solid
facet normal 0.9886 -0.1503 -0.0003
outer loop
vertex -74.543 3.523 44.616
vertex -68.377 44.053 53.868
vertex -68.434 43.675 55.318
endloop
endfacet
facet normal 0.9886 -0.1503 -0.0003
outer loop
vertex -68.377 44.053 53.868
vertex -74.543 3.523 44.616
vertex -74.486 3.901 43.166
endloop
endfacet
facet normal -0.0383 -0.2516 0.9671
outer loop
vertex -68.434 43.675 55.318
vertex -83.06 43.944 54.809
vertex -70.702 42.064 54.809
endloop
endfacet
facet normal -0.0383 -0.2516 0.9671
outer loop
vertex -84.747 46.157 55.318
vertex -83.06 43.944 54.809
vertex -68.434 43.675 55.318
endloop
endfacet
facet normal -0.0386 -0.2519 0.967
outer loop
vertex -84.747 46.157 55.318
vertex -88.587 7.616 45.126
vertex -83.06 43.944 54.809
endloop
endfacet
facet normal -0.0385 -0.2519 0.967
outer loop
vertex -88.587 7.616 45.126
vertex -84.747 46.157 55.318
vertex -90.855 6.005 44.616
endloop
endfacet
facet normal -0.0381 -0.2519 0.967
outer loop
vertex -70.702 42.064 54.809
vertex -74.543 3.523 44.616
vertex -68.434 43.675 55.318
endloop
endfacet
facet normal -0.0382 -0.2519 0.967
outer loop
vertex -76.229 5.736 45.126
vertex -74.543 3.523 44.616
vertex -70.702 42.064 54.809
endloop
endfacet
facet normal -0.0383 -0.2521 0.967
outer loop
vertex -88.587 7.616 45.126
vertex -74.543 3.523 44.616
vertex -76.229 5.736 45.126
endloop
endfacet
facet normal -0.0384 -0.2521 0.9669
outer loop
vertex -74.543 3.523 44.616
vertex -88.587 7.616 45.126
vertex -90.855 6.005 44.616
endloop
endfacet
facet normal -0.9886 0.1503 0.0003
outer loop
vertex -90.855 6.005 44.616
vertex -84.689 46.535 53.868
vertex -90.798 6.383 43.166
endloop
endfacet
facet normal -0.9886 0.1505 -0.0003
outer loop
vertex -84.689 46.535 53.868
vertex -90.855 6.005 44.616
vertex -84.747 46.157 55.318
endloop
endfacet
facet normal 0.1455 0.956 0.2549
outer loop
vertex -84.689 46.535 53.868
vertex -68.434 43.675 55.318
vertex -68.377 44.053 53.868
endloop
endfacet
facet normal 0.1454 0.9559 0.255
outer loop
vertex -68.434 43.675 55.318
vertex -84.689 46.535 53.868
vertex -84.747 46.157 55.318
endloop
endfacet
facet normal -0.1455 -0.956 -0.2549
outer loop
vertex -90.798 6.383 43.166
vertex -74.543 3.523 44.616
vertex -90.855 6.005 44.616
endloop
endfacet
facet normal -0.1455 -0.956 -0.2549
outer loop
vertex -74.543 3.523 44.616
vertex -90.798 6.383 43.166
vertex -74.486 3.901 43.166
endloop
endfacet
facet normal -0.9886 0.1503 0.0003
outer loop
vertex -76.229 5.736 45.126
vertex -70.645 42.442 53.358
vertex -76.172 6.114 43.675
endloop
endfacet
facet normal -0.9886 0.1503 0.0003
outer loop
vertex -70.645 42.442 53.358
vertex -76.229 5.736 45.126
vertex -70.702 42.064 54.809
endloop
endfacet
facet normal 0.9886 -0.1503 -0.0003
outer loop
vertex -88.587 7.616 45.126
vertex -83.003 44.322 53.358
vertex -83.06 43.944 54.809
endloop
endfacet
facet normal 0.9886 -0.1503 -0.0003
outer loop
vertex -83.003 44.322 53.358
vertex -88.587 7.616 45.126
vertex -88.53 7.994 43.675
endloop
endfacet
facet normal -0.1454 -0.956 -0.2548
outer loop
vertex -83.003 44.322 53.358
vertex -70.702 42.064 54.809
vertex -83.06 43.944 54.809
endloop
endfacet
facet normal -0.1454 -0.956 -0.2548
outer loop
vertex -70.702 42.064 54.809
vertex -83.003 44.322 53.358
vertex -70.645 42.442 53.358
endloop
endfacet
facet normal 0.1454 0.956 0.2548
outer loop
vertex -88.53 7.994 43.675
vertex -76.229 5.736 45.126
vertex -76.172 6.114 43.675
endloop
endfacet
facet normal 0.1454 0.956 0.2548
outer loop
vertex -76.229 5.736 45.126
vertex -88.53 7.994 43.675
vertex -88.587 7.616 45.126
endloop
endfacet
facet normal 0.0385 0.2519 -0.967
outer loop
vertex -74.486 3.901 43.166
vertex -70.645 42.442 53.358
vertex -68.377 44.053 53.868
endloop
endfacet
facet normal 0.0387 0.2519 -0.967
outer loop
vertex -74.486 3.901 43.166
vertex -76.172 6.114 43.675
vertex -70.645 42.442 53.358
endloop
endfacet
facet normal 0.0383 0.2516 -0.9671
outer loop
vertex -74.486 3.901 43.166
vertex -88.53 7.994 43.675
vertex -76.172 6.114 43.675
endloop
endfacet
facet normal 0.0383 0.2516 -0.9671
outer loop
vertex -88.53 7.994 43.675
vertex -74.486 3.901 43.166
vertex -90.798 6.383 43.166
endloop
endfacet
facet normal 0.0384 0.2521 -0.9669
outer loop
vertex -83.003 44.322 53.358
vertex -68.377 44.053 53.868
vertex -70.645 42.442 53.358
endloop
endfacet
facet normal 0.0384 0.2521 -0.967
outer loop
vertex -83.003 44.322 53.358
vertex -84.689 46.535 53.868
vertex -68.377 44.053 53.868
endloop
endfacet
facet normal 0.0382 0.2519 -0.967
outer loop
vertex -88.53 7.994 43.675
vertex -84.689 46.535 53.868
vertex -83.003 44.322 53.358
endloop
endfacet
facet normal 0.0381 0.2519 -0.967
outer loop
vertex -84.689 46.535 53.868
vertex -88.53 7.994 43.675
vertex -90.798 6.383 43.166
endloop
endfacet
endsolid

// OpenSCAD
// Generated by SolidPython 1.1.3 on 2025-12-31 05:06:49


translate(v = [-79.52985690209567, 25.595877133079668, 47.06634805542881]) {
	rotate(a = [14.7627925 , 0.        ,-8.65071739]) {
		difference() {
			cube(center = true, size = [16.5000000000, 42.0000000000, 6.0000000000]);
			cube(center = true, size = [12.5000000000, 38.0000000000, 6.1000000000]);
			translate(v = [0.0000000000, 0.0000000000, -1.5000000000]) {
				cube(center = true, size = [18.5000000000, 44.0000000000, 6.0000000000]);
			}
		}
	}
}
/***********************************************
*********      SolidPython code:      **********
************************************************
 
import solid as sl

debug_trace = False

def debugprint(info):
    if debug_trace:
        print(info)

def box(width, height, depth):
    return sl.cube([width, height, depth], center=True)


def cylinder(radius, height, segments=100):
    return sl.cylinder(r=radius, h=height, segments=segments, center=True)


def sphere(radius):
    return sl.sphere(radius)


def cone(r1, r2, height):
    return sl.cylinder(r1=r1, r2=r2, h=height)  # , center=True)


def rotate(shape, angle):
    if shape is None:
        return None
    return sl.rotate(angle)(shape)


def translate(shape, vector):
    if shape is None:
        return None
    return sl.translate(tuple(vector))(shape)


def mirror(shape, plane=None):
    debugprint('mirror()')
    planes = {
        'XY': [0, 0, 1],
        'YX': [0, 0, -1],
        'XZ': [0, 1, 0],
        'ZX': [0, -1, 0],
        'YZ': [1, 0, 0],
        'ZY': [-1, 0, 0],
    }
    return sl.mirror(planes[plane])(shape)


def union(shapes):
    debugprint('union()')
    shape = None
    for item in shapes:
        if item is not None:
            if shape is None:
                shape = item
            else:
                shape += item
    return shape


def add(shapes):
    debugprint('union()')
    shape = None
    for item in shapes:
        if item is not None:
            if shape is None:
                shape = item
            else:
                shape += item
    return shape


def difference(shape, shapes):
    debugprint('difference()')
    for item in shapes:
        if item is not None:
            shape -= item
    return shape


def intersect(shape1, shape2):
    if shape2 is not None:
        return sl.intersection()(shape1, shape2)
    else:
        return shape1

def hull_from_points(points):
    return sl.hull()(*points)


def hull_from_shapes(shapes, points=None):
    hs = []
    if points is not None:
        hs.extend(points)
    if shapes is not None:
        hs.extend(shapes)
    return sl.hull()(*hs)


def tess_hull(shapes, sl_tol=.5, sl_angTol=1):
    return sl.hull()(*shapes)


def triangle_hulls(shapes):
    debugprint('triangle_hulls()')
    hulls = []
    for i in range(len(shapes) - 2):
        hulls.append(hull_from_shapes(shapes[i: (i + 3)]))

    return union(hulls)



def bottom_hull(p, height=0.001):
    debugprint("bottom_hull()")
    shape = None
    for item in p:
        proj = sl.projection()(p)
        t_shape = sl.linear_extrude(height=height, twist=0, convexity=0, center=True)(
            proj
        )
        t_shape = sl.translate([0, 0, height / 2 - 10])(t_shape)
        if shape is None:
            shape = t_shape
        shape = sl.hull()(p, shape, t_shape)
    return shape

def polyline(point_list):
    return sl.polygon(point_list)


# def project_to_plate():
#     square = cq.Workplane('XY').rect(1000, 1000)
#     for wire in square.wires().objects:
#         plane = cq.Workplane('XY').add(cq.Face.makeFromWires(wire))

def extrude_poly(outer_poly, inner_polys=None, height=1):
    if inner_polys is not None:
        return sl.linear_extrude(height=height, twist=0, convexity=0, center=True)(outer_poly, *inner_polys)
    else:
        return sl.linear_extrude(height=height, twist=0, convexity=0, center=True)(outer_poly)


def import_file(fname, convexity=2):
    print("IMPORTING FROM {}".format(fname))
    return sl.import_stl(fname.replace("\\", "/") + ".stl", convexity=convexity)


def export_file(shape, fname):
    print("EXPORTING TO {}".format(fname))
    sl.scad_render_to_file(shape, fname + ".scad")


def export_dxf(shape, fname):
    print("NO DXF EXPORT FOR SOLID".format(fname))
    pass 
 
************************************************/
